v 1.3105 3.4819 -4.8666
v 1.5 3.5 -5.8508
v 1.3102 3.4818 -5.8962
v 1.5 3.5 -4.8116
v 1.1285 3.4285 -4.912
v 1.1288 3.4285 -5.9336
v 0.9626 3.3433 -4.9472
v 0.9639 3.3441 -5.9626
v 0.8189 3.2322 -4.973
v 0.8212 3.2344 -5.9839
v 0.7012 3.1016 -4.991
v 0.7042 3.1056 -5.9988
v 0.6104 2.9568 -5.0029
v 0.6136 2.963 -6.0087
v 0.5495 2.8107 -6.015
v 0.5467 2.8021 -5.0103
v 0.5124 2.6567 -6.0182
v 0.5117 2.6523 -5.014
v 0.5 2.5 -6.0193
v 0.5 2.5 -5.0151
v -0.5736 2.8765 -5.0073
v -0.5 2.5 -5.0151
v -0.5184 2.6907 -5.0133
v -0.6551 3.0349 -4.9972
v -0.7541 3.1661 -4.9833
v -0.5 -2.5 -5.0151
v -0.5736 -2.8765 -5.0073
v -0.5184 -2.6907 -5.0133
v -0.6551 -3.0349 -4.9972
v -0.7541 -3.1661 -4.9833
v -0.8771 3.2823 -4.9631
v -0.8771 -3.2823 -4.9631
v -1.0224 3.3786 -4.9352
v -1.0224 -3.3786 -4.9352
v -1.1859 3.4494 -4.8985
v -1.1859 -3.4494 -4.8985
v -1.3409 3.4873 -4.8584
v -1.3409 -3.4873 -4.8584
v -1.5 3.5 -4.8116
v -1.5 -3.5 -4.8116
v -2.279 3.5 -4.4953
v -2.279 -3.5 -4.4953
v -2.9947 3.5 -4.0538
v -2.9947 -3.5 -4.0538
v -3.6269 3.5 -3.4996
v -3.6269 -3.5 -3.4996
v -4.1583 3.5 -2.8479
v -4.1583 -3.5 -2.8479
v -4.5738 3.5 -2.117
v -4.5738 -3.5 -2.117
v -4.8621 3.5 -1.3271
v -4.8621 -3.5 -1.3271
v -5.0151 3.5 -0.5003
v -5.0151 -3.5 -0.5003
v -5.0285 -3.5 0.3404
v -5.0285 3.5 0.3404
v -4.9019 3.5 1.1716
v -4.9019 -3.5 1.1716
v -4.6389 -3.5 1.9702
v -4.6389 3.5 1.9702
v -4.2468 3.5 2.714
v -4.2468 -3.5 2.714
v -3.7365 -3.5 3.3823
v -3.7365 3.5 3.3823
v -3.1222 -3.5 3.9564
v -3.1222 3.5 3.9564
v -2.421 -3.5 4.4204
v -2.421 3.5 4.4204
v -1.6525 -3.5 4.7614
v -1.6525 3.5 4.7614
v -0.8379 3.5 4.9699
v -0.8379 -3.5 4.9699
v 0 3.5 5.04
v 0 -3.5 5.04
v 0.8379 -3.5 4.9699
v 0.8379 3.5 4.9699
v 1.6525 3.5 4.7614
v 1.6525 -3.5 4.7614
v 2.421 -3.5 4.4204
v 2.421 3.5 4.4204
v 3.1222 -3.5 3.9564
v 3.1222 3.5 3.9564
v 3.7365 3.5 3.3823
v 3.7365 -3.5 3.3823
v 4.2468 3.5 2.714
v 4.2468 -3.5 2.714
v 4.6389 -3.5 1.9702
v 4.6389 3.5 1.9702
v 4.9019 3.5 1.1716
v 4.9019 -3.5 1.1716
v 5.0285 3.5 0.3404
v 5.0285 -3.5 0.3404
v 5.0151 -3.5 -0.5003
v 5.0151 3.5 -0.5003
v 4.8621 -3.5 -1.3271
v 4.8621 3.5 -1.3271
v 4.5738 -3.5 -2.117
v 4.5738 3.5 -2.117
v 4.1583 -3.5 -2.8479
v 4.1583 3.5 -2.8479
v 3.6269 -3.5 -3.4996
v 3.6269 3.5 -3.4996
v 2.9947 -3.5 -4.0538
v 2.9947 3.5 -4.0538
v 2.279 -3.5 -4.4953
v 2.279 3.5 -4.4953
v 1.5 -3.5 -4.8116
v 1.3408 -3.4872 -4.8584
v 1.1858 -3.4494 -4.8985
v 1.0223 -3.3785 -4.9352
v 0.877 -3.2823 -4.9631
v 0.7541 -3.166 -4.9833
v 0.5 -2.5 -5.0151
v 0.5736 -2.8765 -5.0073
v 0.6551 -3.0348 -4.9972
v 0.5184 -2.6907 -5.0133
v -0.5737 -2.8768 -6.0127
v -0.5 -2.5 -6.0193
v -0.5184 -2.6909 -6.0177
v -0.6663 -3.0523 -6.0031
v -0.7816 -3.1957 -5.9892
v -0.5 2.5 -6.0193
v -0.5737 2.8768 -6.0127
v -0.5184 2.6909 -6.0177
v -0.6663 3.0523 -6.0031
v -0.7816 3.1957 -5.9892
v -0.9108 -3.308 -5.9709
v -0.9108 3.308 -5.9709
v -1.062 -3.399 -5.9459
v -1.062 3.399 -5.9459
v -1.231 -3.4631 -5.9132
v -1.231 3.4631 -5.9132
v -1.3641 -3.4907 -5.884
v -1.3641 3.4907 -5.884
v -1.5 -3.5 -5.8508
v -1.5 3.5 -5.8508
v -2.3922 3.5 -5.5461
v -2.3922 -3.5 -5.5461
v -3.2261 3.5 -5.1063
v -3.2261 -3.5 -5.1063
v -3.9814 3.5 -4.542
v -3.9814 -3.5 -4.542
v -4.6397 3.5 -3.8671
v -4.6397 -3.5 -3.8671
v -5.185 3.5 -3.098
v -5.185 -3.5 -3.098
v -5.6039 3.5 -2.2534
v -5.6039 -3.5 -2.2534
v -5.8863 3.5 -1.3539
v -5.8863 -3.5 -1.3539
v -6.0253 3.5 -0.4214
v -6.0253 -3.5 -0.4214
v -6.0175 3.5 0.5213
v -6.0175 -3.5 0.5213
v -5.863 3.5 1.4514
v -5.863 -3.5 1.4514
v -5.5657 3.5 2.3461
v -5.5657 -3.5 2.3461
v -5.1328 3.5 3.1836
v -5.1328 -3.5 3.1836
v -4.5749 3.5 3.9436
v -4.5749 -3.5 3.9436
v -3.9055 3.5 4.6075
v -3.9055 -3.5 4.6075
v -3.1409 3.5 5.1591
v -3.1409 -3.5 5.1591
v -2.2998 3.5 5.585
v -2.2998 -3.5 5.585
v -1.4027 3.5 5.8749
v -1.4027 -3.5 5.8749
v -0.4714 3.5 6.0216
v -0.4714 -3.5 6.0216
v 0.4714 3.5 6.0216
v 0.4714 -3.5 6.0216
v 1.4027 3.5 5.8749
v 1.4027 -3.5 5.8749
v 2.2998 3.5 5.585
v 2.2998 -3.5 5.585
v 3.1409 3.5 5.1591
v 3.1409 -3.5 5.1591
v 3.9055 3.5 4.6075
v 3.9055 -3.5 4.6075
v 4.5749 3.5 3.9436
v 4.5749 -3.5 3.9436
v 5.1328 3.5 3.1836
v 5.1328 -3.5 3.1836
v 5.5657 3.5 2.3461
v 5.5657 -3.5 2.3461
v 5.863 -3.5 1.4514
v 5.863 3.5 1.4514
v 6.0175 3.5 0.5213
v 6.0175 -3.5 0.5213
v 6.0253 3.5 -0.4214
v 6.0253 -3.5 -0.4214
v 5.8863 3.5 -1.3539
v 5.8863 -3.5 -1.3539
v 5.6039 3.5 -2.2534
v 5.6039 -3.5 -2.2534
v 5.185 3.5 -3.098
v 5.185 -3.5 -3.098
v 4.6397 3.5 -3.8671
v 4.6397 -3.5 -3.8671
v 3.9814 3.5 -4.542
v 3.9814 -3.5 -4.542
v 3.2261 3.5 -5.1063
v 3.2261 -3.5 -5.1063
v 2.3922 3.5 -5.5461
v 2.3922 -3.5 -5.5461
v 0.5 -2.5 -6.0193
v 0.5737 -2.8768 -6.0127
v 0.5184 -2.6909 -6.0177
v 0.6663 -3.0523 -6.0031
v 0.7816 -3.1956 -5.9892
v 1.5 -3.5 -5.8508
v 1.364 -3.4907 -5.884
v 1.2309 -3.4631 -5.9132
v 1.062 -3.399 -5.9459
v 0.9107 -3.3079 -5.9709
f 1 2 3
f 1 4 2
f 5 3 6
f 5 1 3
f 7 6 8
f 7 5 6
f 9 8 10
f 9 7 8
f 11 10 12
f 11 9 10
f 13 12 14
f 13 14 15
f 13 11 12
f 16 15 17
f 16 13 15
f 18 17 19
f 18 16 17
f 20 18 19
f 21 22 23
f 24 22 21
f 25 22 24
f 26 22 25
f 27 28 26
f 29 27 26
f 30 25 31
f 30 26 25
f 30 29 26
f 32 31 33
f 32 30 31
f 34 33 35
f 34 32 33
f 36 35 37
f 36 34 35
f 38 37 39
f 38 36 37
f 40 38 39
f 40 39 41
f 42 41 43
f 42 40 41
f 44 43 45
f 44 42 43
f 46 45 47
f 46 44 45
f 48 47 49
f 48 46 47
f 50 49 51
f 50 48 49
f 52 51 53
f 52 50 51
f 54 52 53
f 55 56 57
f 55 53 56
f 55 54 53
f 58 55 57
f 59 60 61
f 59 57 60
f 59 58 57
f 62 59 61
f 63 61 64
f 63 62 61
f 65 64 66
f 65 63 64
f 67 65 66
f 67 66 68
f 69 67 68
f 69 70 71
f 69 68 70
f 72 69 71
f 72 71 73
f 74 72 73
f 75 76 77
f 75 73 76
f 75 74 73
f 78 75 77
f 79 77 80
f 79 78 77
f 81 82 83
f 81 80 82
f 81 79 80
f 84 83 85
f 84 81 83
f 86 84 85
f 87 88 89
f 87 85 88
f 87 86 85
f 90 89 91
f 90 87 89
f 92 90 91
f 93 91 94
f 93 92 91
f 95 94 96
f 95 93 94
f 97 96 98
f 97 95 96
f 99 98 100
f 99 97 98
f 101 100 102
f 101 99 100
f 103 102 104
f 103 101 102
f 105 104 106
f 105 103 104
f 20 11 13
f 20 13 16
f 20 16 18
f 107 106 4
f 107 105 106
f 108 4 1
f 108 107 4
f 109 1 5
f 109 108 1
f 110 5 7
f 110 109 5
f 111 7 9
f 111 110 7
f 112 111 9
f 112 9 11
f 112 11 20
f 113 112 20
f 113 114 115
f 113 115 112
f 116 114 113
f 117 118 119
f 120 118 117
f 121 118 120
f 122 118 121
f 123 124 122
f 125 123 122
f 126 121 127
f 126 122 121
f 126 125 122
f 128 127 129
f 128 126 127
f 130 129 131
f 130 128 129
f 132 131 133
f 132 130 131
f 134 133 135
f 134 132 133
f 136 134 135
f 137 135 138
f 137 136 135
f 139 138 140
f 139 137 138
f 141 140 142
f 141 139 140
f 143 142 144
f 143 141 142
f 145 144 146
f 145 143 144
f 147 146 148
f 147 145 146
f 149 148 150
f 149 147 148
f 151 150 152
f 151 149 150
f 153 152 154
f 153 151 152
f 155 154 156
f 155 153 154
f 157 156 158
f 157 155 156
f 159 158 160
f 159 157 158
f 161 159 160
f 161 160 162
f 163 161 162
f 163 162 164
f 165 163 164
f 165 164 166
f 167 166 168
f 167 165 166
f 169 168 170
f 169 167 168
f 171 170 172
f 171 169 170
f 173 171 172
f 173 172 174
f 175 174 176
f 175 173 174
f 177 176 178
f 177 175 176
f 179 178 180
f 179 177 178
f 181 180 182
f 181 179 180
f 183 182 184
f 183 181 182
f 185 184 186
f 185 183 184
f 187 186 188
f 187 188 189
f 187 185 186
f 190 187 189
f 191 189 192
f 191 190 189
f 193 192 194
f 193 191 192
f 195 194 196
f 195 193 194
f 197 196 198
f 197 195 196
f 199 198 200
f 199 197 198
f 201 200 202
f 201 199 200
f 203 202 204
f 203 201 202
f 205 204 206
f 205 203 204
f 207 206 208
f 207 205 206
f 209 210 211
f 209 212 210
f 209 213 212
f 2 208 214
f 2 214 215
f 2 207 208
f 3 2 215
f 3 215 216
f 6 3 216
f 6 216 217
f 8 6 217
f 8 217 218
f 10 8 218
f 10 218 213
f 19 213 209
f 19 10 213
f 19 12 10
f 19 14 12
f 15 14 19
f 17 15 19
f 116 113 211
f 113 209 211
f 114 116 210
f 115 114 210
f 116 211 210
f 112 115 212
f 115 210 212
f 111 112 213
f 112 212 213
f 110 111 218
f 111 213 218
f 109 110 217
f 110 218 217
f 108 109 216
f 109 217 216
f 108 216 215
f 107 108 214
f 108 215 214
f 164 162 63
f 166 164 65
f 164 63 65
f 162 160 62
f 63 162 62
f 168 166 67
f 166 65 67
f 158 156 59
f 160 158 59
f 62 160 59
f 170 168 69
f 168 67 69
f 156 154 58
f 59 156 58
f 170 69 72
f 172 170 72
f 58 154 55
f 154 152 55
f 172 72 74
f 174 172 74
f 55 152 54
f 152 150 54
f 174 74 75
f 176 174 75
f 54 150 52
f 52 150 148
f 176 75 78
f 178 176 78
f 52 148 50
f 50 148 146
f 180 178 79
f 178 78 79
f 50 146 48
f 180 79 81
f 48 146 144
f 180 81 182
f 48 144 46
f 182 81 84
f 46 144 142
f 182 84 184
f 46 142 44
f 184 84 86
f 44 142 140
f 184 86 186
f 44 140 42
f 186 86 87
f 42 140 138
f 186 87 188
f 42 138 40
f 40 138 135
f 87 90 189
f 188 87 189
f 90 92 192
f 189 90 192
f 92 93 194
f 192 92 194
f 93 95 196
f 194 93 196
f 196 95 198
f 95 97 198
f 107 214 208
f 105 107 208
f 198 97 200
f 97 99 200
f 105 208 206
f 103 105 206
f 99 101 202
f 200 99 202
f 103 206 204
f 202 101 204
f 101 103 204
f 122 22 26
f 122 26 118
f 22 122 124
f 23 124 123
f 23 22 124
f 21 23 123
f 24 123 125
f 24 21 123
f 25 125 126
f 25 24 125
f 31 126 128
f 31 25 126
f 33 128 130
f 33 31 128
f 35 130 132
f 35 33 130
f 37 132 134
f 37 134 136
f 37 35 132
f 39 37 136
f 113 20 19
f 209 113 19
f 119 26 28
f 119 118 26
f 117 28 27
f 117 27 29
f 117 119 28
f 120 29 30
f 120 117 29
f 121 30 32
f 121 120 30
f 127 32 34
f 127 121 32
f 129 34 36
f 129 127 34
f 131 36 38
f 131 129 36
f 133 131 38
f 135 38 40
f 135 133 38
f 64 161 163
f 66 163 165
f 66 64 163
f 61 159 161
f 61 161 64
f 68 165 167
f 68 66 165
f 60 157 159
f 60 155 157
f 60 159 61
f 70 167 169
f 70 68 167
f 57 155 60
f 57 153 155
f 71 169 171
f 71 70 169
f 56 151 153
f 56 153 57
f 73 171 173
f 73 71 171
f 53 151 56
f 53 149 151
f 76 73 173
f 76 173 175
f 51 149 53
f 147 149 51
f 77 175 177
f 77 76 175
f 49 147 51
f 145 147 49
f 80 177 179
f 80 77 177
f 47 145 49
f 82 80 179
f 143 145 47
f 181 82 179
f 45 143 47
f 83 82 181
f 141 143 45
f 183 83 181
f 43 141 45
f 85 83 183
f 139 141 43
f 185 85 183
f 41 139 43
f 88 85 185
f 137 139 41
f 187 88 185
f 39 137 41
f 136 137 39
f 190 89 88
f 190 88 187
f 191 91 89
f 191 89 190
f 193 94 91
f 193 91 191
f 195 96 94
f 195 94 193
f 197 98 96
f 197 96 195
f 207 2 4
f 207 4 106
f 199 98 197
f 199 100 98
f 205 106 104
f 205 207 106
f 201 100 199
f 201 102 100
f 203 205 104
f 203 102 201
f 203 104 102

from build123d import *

# Parameters (mm, degrees)
SKETCH3_R               = 6.04
SKETCH3_R_2             = 5.04
EXTRUDE_THIN1_DEPTH     = 3.5
SKETCH4_W               = 1
SKETCH4_H               = 1000
CUT_EXTRUDE1_DEPTH      = 4.5
CUT_EXTRUDE1_DEPTH_BACK = 4.5
FILLET1_R               = 1


with BuildPart() as part:
    # Sketch3 → Extrude-Thin1 (new body, symmetric)
    with BuildSketch(Plane(origin=(0, 0, 0), x_dir=(1, 0, 0), z_dir=(0, 1, 0))):
        Circle(SKETCH3_R)
        Circle(SKETCH3_R_2, mode=Mode.SUBTRACT)
    extrude(amount=EXTRUDE_THIN1_DEPTH, both=True)

    # Sketch4 → Cut-Extrude1 (cut, two sides)
    with BuildSketch(Plane(origin=(0, 0, 0), x_dir=(1, 0, 0), z_dir=(0, 1, 0))) as cut_extrude1_sk:
        with Locations((0, 500)):
            Rectangle(SKETCH4_W, SKETCH4_H)
    extrude(amount=CUT_EXTRUDE1_DEPTH, mode=Mode.SUBTRACT)
    extrude(cut_extrude1_sk.sketch, amount=-CUT_EXTRUDE1_DEPTH_BACK, mode=Mode.SUBTRACT)

    # Fillet1
    fillet1_edges = [part.edges().sort_by_distance(p)[0] for p in [
        (0.5, -3.5, -5.517203073),
        (-0.5, -3.5, -5.517203073),
        (0.5, 3.5, -5.517203073),
        (-0.5, 3.5, -5.517203073),
    ]]
    fillet(fillet1_edges, radius=FILLET1_R)


solid = part.part
